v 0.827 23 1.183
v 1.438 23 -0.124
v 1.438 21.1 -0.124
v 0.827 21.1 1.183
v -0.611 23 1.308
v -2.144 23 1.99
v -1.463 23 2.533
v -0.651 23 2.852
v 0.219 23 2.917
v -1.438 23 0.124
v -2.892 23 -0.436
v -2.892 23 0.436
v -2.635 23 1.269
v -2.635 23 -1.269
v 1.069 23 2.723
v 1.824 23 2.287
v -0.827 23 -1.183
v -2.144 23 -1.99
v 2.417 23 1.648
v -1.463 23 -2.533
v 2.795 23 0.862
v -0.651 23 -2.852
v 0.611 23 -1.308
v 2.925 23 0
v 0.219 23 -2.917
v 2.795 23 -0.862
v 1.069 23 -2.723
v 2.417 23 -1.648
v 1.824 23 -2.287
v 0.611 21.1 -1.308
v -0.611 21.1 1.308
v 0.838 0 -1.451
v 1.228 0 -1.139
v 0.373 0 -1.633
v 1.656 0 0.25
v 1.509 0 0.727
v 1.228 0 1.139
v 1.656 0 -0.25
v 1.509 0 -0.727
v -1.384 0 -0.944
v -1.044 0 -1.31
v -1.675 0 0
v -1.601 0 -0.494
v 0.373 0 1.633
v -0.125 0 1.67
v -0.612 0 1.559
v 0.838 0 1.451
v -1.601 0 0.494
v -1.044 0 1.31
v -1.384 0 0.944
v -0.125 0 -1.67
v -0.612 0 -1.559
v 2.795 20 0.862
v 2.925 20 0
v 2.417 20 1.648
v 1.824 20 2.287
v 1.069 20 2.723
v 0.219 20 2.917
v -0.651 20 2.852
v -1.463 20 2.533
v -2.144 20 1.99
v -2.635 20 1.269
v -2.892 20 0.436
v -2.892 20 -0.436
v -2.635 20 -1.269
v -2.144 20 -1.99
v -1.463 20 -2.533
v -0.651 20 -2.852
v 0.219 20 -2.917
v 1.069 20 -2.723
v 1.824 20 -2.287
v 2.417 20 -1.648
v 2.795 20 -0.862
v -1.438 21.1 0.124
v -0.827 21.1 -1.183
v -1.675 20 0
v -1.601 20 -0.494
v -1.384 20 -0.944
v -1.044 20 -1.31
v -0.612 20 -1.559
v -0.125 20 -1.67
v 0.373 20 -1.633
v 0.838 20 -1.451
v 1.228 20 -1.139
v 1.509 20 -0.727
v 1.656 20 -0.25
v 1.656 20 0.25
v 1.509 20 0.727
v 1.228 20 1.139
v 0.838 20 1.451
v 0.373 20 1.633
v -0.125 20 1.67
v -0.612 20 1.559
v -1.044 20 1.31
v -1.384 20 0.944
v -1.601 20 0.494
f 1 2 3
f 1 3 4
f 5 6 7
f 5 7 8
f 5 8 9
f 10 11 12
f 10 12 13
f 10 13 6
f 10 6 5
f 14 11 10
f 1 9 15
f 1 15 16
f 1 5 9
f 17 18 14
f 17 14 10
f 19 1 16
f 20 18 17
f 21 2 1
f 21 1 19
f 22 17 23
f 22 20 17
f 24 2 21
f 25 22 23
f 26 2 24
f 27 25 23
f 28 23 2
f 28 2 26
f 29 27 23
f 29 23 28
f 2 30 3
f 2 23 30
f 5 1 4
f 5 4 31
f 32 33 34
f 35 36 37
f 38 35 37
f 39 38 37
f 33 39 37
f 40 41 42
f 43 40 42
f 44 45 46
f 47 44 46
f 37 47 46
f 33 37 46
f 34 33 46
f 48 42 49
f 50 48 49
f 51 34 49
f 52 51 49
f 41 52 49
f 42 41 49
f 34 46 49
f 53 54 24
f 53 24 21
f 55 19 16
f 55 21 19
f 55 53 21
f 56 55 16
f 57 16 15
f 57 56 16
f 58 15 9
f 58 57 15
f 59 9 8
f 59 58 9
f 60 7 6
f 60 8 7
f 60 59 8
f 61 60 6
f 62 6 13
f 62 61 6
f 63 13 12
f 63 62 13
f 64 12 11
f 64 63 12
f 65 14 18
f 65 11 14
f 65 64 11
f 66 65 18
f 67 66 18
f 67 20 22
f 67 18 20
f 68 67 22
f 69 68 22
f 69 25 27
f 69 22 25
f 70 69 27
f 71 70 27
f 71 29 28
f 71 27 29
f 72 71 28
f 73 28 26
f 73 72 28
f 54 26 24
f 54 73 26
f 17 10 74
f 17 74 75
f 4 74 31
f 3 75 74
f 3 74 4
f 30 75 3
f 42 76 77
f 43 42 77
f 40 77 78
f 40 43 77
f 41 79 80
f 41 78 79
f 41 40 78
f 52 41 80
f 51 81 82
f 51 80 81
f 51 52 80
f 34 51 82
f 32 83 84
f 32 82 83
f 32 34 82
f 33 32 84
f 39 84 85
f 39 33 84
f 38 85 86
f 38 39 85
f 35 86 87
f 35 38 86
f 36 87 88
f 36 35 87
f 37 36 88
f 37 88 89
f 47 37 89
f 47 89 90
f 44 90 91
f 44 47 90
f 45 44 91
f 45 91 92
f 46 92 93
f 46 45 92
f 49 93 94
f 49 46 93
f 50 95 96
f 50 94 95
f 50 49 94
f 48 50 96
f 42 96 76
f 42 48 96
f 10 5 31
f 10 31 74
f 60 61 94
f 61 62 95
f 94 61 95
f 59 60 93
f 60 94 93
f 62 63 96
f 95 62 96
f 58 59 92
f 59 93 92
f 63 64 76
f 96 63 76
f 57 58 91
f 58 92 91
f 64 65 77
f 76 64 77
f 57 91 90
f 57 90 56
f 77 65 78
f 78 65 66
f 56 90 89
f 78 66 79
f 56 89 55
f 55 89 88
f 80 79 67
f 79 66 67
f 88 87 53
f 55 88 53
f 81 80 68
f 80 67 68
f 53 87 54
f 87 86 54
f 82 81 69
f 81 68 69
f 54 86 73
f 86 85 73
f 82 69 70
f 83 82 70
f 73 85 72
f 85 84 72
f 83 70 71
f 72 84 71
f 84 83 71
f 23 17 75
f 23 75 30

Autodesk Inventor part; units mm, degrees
ref_plane "YZ Plane" through (0, 0, 0) normal (1, 0, 0) x (0, 1, 0)
ref_plane "XZ Plane" through (0, 0, 0) normal (0, 1, 0) x (-1, 0, 0)
ref_plane "XY Plane" through (0, 0, 0) normal (0, 0, 1) x (1, 0, 0)
sketch "Sketch1" plane through (0, 0, 0) normal (0, 1, 0) x (-1, 0, 0)
  circle A0 centre (0, 0) radius 1.675
  dimension "d0" = 3.35
extrude "Extrusion1" add sketch "Sketch1" along normal blind 20
sketch "Sketch2" plane through (0, 20, 0) normal (0, 1, 0) x (1, 0, 0)
  circle A0 centre (0, 0) radius 1.675 projected
  circle A1 centre (0, 0) radius 2.925
  dimension "d3" = 5.85
extrude "Extrusion2" add sketch "Sketch2" along normal blind 3 contours A0 | A1
sketch "Sketch3" plane through (0, 23, 0) normal (0, 1, 0) x (1, 0, 0)
  line L0 (-0.8268, 1.1831) -> (0.6112, 1.3076)
  line L1 (0.6112, 1.3076) -> (1.438, 0.1244)
  line L2 (1.438, 0.1244) -> (0.8268, -1.1831)
  line L3 (0.8268, -1.1831) -> (-0.6112, -1.3076)
  line L4 (-0.6112, -1.3076) -> (-1.438, -0.1244)
  line L5 (-1.438, -0.1244) -> (-0.8268, 1.1831)
  point P0 (0, 0)
  point P1 (0, 0)
  dimension "d6" = 2.5
extrude "Extrusion3" cut sketch "Sketch3" against normal blind 1.9
equation "\"d0\" = M3_A"
equation "\"d3\" = M3_B"
equation "\"M3_A\" = 3.35"
equation "\"M3_B\" = 5.85"
properties part number "M3_SCREW_20MM"
